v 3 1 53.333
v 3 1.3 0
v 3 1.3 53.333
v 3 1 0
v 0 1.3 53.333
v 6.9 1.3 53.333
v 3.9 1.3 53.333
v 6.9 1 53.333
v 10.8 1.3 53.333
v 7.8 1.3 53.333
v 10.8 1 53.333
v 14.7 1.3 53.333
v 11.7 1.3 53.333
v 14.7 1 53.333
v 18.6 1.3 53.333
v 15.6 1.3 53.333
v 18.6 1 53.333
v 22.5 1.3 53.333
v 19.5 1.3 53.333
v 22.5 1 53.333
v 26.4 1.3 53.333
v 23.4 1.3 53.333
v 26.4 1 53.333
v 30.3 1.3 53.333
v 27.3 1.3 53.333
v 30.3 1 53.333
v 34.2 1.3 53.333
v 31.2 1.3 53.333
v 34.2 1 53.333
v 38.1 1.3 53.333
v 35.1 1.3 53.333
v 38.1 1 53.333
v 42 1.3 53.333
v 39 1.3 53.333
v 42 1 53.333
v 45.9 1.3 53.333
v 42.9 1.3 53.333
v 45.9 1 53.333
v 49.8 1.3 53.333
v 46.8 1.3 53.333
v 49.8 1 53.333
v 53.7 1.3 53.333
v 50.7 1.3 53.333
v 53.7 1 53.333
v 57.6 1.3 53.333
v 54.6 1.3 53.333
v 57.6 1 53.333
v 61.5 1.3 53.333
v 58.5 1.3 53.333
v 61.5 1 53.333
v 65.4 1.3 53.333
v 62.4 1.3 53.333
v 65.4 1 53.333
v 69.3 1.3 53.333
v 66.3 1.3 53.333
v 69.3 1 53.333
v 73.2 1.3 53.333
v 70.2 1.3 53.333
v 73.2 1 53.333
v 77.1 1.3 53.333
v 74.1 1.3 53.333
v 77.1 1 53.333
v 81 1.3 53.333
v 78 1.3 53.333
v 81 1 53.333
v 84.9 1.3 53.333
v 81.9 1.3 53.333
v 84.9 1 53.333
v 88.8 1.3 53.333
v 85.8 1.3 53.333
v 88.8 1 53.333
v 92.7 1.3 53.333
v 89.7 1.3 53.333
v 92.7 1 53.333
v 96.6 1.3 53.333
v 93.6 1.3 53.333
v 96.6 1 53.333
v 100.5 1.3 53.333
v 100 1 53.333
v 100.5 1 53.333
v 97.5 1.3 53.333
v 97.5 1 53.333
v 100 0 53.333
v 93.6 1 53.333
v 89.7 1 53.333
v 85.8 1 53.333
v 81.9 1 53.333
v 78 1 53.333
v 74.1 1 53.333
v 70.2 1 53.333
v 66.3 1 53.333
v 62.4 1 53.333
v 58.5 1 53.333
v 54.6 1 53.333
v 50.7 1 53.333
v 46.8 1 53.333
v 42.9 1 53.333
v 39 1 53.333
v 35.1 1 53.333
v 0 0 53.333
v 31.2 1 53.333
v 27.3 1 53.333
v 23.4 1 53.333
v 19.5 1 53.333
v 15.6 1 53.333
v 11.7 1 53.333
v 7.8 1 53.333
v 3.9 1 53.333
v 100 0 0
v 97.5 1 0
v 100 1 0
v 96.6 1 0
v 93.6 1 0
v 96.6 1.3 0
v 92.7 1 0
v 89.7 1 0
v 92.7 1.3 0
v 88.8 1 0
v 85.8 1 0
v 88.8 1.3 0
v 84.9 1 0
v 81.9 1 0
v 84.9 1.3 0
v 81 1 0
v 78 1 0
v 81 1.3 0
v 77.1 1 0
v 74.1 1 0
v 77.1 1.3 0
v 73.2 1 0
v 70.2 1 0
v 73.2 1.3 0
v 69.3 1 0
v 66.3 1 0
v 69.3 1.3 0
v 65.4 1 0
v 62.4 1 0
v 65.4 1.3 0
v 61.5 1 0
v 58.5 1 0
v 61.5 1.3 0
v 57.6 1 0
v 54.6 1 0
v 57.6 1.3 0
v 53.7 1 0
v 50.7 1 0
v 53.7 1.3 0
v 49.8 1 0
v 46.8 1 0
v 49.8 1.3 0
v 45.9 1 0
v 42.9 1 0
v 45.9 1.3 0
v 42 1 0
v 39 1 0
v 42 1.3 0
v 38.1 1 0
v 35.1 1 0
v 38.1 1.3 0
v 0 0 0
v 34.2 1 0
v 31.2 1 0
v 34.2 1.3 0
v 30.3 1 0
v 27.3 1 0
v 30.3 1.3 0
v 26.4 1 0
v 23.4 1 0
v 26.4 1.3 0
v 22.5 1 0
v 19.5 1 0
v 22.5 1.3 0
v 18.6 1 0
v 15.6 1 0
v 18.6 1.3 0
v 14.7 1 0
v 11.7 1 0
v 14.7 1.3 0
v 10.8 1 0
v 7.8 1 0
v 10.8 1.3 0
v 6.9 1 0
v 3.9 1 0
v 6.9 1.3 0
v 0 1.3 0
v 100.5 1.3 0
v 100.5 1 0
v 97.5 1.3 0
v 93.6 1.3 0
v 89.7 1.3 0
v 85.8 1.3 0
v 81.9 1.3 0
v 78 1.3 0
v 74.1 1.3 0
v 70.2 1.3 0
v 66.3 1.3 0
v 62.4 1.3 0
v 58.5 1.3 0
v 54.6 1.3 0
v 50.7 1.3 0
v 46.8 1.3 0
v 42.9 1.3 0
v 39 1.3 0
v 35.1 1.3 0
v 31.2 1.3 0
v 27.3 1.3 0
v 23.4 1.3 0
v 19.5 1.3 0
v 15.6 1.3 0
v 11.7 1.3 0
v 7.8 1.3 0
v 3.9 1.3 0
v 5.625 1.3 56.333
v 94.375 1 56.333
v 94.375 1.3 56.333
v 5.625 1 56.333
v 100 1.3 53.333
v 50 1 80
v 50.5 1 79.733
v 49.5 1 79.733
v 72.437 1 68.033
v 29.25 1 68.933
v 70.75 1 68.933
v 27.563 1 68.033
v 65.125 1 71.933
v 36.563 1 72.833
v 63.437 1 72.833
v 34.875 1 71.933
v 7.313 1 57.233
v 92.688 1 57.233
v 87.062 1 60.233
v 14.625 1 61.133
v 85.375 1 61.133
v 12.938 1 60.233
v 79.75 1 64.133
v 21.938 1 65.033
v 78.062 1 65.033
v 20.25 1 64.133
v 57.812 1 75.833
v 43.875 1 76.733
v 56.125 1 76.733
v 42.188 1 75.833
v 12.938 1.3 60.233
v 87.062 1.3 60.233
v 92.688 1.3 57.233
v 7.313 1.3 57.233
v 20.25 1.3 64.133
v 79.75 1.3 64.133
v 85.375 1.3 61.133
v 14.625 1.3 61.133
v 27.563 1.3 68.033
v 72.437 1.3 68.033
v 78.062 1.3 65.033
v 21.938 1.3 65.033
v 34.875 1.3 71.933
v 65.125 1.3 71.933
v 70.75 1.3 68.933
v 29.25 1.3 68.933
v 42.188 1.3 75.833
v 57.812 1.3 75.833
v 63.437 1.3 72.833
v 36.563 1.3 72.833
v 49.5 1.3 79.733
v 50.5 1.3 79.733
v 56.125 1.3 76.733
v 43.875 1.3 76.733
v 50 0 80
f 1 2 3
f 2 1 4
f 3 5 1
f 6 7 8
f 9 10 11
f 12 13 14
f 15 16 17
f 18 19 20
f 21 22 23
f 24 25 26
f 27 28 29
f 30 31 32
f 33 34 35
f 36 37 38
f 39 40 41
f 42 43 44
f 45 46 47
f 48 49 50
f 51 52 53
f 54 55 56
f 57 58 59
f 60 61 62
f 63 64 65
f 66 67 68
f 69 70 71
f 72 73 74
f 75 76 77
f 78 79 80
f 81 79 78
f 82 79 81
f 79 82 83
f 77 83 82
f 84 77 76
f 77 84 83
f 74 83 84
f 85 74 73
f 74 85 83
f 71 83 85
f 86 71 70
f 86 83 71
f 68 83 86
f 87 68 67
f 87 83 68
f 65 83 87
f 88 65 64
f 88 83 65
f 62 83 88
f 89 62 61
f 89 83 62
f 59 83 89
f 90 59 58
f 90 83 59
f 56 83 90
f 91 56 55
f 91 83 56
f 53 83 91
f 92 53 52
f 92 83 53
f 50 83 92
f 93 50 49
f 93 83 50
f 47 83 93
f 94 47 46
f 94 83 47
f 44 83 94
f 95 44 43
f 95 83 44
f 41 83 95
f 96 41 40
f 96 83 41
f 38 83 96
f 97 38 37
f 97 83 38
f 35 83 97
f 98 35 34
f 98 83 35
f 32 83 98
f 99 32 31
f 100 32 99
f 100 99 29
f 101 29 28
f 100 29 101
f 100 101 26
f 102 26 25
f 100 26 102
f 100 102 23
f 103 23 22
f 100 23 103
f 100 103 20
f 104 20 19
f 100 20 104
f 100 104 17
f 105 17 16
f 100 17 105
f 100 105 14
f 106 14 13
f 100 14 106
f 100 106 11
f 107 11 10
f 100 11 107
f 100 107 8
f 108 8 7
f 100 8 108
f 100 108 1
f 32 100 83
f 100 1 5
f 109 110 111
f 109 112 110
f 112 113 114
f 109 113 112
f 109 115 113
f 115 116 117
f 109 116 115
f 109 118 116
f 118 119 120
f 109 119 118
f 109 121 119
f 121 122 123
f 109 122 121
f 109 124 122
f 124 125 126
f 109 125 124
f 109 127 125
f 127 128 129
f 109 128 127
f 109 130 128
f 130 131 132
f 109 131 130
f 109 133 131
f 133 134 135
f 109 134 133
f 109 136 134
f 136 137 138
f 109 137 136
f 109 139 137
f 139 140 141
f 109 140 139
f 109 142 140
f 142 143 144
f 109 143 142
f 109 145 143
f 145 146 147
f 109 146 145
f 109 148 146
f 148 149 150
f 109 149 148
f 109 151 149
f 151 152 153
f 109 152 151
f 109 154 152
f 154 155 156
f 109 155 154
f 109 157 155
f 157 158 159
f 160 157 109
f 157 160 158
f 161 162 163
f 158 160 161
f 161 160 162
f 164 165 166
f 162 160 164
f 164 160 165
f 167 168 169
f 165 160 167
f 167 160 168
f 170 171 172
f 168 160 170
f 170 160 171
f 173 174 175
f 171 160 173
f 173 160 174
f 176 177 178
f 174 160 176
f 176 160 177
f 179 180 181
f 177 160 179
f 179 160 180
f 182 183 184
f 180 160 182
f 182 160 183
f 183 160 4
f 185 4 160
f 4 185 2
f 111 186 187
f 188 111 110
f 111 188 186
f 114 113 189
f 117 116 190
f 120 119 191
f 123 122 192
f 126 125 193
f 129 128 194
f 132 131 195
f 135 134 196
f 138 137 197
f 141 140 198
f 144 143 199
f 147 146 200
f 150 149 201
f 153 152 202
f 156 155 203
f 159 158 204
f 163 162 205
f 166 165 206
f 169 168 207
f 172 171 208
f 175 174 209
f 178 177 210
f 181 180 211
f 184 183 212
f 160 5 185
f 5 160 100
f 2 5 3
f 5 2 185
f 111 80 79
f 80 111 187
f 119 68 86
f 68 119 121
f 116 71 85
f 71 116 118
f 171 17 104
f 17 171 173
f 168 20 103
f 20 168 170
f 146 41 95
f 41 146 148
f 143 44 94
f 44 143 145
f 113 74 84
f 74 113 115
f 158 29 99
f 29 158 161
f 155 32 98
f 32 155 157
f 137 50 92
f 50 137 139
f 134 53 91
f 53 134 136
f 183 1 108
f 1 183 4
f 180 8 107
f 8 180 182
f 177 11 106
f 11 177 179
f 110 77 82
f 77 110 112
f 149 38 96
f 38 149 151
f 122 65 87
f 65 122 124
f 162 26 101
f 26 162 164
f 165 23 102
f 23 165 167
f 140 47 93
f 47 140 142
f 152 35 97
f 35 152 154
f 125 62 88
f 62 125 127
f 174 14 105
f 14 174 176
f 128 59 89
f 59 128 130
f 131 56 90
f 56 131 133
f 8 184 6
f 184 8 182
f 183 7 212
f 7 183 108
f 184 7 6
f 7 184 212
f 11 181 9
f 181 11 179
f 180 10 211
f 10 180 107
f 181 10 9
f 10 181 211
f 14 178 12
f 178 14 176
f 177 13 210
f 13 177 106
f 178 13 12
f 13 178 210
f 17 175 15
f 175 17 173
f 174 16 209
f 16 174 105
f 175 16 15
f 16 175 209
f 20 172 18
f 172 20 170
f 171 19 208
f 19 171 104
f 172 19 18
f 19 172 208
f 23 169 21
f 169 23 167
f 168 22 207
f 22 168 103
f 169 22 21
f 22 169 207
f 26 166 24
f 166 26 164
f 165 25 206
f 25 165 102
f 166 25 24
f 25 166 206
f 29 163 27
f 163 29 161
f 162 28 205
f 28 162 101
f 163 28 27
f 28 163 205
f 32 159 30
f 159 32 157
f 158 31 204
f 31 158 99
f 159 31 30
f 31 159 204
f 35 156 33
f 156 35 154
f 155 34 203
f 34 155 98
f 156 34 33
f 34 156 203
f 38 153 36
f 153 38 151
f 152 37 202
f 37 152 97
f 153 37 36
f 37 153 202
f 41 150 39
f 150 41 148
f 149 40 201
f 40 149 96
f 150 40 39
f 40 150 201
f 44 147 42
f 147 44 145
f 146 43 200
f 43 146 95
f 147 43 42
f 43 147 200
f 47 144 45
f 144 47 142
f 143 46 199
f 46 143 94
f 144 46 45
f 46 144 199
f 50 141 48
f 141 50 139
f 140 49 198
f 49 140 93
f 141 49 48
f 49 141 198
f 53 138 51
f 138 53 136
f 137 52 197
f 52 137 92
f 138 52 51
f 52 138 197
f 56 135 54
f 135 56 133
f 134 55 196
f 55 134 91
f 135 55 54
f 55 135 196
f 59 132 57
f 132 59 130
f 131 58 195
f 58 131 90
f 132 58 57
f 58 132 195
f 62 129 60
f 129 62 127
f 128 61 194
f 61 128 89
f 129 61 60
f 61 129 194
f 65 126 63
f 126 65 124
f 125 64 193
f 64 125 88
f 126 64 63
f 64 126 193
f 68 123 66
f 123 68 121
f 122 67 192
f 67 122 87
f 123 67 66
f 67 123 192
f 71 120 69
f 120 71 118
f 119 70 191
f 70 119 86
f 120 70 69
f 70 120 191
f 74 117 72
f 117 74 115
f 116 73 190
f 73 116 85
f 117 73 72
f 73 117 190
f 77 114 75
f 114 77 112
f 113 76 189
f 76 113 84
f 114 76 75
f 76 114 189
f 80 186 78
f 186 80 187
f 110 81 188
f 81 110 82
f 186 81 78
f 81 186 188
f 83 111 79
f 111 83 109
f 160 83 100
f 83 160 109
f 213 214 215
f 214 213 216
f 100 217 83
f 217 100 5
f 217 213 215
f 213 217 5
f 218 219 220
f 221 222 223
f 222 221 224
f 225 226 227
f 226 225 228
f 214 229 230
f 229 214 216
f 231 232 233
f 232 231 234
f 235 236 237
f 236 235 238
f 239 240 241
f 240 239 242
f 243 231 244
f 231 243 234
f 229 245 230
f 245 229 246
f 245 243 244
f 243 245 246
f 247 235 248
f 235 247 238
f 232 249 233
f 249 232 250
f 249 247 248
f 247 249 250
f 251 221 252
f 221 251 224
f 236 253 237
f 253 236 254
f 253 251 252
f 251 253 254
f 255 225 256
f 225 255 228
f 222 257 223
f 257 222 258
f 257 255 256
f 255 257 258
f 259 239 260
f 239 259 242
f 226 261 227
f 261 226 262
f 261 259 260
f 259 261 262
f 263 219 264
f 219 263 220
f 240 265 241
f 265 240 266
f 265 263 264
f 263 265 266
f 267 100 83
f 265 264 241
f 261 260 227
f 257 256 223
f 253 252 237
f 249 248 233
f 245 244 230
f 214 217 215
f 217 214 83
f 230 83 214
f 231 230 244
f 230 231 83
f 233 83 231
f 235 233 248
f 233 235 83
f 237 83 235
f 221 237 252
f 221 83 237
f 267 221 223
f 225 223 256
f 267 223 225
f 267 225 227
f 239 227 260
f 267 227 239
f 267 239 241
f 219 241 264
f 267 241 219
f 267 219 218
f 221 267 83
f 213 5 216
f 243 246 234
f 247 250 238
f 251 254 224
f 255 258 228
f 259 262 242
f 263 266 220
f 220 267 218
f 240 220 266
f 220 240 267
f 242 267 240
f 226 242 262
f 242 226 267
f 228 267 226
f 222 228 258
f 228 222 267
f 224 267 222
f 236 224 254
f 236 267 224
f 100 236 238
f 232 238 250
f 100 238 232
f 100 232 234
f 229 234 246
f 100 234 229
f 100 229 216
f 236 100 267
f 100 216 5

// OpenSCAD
// winter market building

//settings
{
    //enable details for final rendering
    balken_an = true;
    balken_spacing = 1.3;
    balken_thickness = 0.3;
    balken_width = 3;

    laenge = 100;
    breite = 90;
    hoehe = 80;

}



//elements
{
    
module triangle(o_len, a_len, depth, center=false)
{
    centroid = center ? [-a_len/3, -o_len/3, -depth/2] : [0, 0, 0];
    translate(centroid) linear_extrude(height=depth)
    {
        polygon(points=[[0,0],[a_len,0],[0,o_len]], paths=[[0,1,2]]);
    }
}
    
module top_wall(laenge, hoehe, dicke, offset_hoehe=0){
    intersection(){
        translate([laenge,0,offset_hoehe])
        rotate([0,-90,0])
        wall(hoehe,laenge,  dicke);
        union(){
            translate([laenge/2,0,offset_hoehe])
            rotate([-90,-90,0])
            triangle(laenge/2, hoehe, dicke*5);
            translate([laenge/2,dicke*5,offset_hoehe])
            rotate([90,-90,0])
            triangle(laenge/2, hoehe, dicke*5);
        }
    }
}
    
module wall(laenge, hoehe, dicke){
    difference(){
        union(){
            cube([laenge, dicke, hoehe]);
            if(balken_an){
                for(bar=[0:balken_spacing*balken_width:laenge]){
                    translate([bar, 1,0]){
                        cube([balken_width, balken_thickness, hoehe]);
                    }
                }
            }
        }
       
       

    }
  

}

wall(laenge,hoehe*2/3, ,1);
top_wall(laenge,hoehe*1/3,1,hoehe*2/3);

}
